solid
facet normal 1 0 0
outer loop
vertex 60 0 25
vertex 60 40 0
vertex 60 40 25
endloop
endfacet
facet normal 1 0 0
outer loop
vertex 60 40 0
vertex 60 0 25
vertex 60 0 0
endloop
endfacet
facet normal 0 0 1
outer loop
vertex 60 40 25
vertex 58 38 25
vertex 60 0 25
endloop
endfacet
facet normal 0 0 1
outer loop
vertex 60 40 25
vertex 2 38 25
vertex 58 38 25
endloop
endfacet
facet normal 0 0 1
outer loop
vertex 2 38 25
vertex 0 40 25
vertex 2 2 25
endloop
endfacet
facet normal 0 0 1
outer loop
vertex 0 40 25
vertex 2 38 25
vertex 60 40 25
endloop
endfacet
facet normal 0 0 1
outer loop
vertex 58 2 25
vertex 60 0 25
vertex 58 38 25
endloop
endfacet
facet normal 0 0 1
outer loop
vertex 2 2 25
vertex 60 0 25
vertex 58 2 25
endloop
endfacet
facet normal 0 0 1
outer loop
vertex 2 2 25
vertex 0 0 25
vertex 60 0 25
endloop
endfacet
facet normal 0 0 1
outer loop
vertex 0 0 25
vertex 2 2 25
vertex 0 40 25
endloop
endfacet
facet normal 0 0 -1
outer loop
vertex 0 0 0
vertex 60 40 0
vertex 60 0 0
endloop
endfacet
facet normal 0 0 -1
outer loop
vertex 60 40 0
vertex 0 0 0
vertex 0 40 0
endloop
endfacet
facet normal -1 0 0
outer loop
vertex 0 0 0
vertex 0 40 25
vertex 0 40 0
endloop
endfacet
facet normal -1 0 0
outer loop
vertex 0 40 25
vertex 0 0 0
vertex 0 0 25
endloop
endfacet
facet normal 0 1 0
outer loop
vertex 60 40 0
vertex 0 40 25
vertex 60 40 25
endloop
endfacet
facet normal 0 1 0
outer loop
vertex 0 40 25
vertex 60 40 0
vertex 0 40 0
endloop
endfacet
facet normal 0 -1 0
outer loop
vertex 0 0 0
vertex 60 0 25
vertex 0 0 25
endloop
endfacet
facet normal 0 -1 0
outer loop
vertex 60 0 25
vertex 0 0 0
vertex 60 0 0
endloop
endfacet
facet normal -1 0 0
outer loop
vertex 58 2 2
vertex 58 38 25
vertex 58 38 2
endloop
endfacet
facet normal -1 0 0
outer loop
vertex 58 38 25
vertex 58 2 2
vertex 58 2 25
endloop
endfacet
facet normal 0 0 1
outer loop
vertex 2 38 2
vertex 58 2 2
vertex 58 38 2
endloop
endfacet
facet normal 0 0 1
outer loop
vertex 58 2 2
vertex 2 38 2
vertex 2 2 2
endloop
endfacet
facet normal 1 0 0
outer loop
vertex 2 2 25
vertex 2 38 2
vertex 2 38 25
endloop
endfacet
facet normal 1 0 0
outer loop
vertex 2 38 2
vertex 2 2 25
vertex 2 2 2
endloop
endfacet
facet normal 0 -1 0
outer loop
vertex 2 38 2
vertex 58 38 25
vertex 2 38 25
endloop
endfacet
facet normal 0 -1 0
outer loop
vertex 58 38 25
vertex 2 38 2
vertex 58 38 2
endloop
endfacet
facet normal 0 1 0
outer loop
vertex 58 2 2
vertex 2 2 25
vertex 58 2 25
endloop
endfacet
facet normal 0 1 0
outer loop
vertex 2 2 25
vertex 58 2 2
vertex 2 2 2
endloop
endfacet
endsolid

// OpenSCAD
// units=mm — generated by scad_emitter.py
// part=unnamed
$fn = 48;

difference() { cube([60, 40, 25]); translate([2, 2, 2]) cube([56, 36, 25]); }
